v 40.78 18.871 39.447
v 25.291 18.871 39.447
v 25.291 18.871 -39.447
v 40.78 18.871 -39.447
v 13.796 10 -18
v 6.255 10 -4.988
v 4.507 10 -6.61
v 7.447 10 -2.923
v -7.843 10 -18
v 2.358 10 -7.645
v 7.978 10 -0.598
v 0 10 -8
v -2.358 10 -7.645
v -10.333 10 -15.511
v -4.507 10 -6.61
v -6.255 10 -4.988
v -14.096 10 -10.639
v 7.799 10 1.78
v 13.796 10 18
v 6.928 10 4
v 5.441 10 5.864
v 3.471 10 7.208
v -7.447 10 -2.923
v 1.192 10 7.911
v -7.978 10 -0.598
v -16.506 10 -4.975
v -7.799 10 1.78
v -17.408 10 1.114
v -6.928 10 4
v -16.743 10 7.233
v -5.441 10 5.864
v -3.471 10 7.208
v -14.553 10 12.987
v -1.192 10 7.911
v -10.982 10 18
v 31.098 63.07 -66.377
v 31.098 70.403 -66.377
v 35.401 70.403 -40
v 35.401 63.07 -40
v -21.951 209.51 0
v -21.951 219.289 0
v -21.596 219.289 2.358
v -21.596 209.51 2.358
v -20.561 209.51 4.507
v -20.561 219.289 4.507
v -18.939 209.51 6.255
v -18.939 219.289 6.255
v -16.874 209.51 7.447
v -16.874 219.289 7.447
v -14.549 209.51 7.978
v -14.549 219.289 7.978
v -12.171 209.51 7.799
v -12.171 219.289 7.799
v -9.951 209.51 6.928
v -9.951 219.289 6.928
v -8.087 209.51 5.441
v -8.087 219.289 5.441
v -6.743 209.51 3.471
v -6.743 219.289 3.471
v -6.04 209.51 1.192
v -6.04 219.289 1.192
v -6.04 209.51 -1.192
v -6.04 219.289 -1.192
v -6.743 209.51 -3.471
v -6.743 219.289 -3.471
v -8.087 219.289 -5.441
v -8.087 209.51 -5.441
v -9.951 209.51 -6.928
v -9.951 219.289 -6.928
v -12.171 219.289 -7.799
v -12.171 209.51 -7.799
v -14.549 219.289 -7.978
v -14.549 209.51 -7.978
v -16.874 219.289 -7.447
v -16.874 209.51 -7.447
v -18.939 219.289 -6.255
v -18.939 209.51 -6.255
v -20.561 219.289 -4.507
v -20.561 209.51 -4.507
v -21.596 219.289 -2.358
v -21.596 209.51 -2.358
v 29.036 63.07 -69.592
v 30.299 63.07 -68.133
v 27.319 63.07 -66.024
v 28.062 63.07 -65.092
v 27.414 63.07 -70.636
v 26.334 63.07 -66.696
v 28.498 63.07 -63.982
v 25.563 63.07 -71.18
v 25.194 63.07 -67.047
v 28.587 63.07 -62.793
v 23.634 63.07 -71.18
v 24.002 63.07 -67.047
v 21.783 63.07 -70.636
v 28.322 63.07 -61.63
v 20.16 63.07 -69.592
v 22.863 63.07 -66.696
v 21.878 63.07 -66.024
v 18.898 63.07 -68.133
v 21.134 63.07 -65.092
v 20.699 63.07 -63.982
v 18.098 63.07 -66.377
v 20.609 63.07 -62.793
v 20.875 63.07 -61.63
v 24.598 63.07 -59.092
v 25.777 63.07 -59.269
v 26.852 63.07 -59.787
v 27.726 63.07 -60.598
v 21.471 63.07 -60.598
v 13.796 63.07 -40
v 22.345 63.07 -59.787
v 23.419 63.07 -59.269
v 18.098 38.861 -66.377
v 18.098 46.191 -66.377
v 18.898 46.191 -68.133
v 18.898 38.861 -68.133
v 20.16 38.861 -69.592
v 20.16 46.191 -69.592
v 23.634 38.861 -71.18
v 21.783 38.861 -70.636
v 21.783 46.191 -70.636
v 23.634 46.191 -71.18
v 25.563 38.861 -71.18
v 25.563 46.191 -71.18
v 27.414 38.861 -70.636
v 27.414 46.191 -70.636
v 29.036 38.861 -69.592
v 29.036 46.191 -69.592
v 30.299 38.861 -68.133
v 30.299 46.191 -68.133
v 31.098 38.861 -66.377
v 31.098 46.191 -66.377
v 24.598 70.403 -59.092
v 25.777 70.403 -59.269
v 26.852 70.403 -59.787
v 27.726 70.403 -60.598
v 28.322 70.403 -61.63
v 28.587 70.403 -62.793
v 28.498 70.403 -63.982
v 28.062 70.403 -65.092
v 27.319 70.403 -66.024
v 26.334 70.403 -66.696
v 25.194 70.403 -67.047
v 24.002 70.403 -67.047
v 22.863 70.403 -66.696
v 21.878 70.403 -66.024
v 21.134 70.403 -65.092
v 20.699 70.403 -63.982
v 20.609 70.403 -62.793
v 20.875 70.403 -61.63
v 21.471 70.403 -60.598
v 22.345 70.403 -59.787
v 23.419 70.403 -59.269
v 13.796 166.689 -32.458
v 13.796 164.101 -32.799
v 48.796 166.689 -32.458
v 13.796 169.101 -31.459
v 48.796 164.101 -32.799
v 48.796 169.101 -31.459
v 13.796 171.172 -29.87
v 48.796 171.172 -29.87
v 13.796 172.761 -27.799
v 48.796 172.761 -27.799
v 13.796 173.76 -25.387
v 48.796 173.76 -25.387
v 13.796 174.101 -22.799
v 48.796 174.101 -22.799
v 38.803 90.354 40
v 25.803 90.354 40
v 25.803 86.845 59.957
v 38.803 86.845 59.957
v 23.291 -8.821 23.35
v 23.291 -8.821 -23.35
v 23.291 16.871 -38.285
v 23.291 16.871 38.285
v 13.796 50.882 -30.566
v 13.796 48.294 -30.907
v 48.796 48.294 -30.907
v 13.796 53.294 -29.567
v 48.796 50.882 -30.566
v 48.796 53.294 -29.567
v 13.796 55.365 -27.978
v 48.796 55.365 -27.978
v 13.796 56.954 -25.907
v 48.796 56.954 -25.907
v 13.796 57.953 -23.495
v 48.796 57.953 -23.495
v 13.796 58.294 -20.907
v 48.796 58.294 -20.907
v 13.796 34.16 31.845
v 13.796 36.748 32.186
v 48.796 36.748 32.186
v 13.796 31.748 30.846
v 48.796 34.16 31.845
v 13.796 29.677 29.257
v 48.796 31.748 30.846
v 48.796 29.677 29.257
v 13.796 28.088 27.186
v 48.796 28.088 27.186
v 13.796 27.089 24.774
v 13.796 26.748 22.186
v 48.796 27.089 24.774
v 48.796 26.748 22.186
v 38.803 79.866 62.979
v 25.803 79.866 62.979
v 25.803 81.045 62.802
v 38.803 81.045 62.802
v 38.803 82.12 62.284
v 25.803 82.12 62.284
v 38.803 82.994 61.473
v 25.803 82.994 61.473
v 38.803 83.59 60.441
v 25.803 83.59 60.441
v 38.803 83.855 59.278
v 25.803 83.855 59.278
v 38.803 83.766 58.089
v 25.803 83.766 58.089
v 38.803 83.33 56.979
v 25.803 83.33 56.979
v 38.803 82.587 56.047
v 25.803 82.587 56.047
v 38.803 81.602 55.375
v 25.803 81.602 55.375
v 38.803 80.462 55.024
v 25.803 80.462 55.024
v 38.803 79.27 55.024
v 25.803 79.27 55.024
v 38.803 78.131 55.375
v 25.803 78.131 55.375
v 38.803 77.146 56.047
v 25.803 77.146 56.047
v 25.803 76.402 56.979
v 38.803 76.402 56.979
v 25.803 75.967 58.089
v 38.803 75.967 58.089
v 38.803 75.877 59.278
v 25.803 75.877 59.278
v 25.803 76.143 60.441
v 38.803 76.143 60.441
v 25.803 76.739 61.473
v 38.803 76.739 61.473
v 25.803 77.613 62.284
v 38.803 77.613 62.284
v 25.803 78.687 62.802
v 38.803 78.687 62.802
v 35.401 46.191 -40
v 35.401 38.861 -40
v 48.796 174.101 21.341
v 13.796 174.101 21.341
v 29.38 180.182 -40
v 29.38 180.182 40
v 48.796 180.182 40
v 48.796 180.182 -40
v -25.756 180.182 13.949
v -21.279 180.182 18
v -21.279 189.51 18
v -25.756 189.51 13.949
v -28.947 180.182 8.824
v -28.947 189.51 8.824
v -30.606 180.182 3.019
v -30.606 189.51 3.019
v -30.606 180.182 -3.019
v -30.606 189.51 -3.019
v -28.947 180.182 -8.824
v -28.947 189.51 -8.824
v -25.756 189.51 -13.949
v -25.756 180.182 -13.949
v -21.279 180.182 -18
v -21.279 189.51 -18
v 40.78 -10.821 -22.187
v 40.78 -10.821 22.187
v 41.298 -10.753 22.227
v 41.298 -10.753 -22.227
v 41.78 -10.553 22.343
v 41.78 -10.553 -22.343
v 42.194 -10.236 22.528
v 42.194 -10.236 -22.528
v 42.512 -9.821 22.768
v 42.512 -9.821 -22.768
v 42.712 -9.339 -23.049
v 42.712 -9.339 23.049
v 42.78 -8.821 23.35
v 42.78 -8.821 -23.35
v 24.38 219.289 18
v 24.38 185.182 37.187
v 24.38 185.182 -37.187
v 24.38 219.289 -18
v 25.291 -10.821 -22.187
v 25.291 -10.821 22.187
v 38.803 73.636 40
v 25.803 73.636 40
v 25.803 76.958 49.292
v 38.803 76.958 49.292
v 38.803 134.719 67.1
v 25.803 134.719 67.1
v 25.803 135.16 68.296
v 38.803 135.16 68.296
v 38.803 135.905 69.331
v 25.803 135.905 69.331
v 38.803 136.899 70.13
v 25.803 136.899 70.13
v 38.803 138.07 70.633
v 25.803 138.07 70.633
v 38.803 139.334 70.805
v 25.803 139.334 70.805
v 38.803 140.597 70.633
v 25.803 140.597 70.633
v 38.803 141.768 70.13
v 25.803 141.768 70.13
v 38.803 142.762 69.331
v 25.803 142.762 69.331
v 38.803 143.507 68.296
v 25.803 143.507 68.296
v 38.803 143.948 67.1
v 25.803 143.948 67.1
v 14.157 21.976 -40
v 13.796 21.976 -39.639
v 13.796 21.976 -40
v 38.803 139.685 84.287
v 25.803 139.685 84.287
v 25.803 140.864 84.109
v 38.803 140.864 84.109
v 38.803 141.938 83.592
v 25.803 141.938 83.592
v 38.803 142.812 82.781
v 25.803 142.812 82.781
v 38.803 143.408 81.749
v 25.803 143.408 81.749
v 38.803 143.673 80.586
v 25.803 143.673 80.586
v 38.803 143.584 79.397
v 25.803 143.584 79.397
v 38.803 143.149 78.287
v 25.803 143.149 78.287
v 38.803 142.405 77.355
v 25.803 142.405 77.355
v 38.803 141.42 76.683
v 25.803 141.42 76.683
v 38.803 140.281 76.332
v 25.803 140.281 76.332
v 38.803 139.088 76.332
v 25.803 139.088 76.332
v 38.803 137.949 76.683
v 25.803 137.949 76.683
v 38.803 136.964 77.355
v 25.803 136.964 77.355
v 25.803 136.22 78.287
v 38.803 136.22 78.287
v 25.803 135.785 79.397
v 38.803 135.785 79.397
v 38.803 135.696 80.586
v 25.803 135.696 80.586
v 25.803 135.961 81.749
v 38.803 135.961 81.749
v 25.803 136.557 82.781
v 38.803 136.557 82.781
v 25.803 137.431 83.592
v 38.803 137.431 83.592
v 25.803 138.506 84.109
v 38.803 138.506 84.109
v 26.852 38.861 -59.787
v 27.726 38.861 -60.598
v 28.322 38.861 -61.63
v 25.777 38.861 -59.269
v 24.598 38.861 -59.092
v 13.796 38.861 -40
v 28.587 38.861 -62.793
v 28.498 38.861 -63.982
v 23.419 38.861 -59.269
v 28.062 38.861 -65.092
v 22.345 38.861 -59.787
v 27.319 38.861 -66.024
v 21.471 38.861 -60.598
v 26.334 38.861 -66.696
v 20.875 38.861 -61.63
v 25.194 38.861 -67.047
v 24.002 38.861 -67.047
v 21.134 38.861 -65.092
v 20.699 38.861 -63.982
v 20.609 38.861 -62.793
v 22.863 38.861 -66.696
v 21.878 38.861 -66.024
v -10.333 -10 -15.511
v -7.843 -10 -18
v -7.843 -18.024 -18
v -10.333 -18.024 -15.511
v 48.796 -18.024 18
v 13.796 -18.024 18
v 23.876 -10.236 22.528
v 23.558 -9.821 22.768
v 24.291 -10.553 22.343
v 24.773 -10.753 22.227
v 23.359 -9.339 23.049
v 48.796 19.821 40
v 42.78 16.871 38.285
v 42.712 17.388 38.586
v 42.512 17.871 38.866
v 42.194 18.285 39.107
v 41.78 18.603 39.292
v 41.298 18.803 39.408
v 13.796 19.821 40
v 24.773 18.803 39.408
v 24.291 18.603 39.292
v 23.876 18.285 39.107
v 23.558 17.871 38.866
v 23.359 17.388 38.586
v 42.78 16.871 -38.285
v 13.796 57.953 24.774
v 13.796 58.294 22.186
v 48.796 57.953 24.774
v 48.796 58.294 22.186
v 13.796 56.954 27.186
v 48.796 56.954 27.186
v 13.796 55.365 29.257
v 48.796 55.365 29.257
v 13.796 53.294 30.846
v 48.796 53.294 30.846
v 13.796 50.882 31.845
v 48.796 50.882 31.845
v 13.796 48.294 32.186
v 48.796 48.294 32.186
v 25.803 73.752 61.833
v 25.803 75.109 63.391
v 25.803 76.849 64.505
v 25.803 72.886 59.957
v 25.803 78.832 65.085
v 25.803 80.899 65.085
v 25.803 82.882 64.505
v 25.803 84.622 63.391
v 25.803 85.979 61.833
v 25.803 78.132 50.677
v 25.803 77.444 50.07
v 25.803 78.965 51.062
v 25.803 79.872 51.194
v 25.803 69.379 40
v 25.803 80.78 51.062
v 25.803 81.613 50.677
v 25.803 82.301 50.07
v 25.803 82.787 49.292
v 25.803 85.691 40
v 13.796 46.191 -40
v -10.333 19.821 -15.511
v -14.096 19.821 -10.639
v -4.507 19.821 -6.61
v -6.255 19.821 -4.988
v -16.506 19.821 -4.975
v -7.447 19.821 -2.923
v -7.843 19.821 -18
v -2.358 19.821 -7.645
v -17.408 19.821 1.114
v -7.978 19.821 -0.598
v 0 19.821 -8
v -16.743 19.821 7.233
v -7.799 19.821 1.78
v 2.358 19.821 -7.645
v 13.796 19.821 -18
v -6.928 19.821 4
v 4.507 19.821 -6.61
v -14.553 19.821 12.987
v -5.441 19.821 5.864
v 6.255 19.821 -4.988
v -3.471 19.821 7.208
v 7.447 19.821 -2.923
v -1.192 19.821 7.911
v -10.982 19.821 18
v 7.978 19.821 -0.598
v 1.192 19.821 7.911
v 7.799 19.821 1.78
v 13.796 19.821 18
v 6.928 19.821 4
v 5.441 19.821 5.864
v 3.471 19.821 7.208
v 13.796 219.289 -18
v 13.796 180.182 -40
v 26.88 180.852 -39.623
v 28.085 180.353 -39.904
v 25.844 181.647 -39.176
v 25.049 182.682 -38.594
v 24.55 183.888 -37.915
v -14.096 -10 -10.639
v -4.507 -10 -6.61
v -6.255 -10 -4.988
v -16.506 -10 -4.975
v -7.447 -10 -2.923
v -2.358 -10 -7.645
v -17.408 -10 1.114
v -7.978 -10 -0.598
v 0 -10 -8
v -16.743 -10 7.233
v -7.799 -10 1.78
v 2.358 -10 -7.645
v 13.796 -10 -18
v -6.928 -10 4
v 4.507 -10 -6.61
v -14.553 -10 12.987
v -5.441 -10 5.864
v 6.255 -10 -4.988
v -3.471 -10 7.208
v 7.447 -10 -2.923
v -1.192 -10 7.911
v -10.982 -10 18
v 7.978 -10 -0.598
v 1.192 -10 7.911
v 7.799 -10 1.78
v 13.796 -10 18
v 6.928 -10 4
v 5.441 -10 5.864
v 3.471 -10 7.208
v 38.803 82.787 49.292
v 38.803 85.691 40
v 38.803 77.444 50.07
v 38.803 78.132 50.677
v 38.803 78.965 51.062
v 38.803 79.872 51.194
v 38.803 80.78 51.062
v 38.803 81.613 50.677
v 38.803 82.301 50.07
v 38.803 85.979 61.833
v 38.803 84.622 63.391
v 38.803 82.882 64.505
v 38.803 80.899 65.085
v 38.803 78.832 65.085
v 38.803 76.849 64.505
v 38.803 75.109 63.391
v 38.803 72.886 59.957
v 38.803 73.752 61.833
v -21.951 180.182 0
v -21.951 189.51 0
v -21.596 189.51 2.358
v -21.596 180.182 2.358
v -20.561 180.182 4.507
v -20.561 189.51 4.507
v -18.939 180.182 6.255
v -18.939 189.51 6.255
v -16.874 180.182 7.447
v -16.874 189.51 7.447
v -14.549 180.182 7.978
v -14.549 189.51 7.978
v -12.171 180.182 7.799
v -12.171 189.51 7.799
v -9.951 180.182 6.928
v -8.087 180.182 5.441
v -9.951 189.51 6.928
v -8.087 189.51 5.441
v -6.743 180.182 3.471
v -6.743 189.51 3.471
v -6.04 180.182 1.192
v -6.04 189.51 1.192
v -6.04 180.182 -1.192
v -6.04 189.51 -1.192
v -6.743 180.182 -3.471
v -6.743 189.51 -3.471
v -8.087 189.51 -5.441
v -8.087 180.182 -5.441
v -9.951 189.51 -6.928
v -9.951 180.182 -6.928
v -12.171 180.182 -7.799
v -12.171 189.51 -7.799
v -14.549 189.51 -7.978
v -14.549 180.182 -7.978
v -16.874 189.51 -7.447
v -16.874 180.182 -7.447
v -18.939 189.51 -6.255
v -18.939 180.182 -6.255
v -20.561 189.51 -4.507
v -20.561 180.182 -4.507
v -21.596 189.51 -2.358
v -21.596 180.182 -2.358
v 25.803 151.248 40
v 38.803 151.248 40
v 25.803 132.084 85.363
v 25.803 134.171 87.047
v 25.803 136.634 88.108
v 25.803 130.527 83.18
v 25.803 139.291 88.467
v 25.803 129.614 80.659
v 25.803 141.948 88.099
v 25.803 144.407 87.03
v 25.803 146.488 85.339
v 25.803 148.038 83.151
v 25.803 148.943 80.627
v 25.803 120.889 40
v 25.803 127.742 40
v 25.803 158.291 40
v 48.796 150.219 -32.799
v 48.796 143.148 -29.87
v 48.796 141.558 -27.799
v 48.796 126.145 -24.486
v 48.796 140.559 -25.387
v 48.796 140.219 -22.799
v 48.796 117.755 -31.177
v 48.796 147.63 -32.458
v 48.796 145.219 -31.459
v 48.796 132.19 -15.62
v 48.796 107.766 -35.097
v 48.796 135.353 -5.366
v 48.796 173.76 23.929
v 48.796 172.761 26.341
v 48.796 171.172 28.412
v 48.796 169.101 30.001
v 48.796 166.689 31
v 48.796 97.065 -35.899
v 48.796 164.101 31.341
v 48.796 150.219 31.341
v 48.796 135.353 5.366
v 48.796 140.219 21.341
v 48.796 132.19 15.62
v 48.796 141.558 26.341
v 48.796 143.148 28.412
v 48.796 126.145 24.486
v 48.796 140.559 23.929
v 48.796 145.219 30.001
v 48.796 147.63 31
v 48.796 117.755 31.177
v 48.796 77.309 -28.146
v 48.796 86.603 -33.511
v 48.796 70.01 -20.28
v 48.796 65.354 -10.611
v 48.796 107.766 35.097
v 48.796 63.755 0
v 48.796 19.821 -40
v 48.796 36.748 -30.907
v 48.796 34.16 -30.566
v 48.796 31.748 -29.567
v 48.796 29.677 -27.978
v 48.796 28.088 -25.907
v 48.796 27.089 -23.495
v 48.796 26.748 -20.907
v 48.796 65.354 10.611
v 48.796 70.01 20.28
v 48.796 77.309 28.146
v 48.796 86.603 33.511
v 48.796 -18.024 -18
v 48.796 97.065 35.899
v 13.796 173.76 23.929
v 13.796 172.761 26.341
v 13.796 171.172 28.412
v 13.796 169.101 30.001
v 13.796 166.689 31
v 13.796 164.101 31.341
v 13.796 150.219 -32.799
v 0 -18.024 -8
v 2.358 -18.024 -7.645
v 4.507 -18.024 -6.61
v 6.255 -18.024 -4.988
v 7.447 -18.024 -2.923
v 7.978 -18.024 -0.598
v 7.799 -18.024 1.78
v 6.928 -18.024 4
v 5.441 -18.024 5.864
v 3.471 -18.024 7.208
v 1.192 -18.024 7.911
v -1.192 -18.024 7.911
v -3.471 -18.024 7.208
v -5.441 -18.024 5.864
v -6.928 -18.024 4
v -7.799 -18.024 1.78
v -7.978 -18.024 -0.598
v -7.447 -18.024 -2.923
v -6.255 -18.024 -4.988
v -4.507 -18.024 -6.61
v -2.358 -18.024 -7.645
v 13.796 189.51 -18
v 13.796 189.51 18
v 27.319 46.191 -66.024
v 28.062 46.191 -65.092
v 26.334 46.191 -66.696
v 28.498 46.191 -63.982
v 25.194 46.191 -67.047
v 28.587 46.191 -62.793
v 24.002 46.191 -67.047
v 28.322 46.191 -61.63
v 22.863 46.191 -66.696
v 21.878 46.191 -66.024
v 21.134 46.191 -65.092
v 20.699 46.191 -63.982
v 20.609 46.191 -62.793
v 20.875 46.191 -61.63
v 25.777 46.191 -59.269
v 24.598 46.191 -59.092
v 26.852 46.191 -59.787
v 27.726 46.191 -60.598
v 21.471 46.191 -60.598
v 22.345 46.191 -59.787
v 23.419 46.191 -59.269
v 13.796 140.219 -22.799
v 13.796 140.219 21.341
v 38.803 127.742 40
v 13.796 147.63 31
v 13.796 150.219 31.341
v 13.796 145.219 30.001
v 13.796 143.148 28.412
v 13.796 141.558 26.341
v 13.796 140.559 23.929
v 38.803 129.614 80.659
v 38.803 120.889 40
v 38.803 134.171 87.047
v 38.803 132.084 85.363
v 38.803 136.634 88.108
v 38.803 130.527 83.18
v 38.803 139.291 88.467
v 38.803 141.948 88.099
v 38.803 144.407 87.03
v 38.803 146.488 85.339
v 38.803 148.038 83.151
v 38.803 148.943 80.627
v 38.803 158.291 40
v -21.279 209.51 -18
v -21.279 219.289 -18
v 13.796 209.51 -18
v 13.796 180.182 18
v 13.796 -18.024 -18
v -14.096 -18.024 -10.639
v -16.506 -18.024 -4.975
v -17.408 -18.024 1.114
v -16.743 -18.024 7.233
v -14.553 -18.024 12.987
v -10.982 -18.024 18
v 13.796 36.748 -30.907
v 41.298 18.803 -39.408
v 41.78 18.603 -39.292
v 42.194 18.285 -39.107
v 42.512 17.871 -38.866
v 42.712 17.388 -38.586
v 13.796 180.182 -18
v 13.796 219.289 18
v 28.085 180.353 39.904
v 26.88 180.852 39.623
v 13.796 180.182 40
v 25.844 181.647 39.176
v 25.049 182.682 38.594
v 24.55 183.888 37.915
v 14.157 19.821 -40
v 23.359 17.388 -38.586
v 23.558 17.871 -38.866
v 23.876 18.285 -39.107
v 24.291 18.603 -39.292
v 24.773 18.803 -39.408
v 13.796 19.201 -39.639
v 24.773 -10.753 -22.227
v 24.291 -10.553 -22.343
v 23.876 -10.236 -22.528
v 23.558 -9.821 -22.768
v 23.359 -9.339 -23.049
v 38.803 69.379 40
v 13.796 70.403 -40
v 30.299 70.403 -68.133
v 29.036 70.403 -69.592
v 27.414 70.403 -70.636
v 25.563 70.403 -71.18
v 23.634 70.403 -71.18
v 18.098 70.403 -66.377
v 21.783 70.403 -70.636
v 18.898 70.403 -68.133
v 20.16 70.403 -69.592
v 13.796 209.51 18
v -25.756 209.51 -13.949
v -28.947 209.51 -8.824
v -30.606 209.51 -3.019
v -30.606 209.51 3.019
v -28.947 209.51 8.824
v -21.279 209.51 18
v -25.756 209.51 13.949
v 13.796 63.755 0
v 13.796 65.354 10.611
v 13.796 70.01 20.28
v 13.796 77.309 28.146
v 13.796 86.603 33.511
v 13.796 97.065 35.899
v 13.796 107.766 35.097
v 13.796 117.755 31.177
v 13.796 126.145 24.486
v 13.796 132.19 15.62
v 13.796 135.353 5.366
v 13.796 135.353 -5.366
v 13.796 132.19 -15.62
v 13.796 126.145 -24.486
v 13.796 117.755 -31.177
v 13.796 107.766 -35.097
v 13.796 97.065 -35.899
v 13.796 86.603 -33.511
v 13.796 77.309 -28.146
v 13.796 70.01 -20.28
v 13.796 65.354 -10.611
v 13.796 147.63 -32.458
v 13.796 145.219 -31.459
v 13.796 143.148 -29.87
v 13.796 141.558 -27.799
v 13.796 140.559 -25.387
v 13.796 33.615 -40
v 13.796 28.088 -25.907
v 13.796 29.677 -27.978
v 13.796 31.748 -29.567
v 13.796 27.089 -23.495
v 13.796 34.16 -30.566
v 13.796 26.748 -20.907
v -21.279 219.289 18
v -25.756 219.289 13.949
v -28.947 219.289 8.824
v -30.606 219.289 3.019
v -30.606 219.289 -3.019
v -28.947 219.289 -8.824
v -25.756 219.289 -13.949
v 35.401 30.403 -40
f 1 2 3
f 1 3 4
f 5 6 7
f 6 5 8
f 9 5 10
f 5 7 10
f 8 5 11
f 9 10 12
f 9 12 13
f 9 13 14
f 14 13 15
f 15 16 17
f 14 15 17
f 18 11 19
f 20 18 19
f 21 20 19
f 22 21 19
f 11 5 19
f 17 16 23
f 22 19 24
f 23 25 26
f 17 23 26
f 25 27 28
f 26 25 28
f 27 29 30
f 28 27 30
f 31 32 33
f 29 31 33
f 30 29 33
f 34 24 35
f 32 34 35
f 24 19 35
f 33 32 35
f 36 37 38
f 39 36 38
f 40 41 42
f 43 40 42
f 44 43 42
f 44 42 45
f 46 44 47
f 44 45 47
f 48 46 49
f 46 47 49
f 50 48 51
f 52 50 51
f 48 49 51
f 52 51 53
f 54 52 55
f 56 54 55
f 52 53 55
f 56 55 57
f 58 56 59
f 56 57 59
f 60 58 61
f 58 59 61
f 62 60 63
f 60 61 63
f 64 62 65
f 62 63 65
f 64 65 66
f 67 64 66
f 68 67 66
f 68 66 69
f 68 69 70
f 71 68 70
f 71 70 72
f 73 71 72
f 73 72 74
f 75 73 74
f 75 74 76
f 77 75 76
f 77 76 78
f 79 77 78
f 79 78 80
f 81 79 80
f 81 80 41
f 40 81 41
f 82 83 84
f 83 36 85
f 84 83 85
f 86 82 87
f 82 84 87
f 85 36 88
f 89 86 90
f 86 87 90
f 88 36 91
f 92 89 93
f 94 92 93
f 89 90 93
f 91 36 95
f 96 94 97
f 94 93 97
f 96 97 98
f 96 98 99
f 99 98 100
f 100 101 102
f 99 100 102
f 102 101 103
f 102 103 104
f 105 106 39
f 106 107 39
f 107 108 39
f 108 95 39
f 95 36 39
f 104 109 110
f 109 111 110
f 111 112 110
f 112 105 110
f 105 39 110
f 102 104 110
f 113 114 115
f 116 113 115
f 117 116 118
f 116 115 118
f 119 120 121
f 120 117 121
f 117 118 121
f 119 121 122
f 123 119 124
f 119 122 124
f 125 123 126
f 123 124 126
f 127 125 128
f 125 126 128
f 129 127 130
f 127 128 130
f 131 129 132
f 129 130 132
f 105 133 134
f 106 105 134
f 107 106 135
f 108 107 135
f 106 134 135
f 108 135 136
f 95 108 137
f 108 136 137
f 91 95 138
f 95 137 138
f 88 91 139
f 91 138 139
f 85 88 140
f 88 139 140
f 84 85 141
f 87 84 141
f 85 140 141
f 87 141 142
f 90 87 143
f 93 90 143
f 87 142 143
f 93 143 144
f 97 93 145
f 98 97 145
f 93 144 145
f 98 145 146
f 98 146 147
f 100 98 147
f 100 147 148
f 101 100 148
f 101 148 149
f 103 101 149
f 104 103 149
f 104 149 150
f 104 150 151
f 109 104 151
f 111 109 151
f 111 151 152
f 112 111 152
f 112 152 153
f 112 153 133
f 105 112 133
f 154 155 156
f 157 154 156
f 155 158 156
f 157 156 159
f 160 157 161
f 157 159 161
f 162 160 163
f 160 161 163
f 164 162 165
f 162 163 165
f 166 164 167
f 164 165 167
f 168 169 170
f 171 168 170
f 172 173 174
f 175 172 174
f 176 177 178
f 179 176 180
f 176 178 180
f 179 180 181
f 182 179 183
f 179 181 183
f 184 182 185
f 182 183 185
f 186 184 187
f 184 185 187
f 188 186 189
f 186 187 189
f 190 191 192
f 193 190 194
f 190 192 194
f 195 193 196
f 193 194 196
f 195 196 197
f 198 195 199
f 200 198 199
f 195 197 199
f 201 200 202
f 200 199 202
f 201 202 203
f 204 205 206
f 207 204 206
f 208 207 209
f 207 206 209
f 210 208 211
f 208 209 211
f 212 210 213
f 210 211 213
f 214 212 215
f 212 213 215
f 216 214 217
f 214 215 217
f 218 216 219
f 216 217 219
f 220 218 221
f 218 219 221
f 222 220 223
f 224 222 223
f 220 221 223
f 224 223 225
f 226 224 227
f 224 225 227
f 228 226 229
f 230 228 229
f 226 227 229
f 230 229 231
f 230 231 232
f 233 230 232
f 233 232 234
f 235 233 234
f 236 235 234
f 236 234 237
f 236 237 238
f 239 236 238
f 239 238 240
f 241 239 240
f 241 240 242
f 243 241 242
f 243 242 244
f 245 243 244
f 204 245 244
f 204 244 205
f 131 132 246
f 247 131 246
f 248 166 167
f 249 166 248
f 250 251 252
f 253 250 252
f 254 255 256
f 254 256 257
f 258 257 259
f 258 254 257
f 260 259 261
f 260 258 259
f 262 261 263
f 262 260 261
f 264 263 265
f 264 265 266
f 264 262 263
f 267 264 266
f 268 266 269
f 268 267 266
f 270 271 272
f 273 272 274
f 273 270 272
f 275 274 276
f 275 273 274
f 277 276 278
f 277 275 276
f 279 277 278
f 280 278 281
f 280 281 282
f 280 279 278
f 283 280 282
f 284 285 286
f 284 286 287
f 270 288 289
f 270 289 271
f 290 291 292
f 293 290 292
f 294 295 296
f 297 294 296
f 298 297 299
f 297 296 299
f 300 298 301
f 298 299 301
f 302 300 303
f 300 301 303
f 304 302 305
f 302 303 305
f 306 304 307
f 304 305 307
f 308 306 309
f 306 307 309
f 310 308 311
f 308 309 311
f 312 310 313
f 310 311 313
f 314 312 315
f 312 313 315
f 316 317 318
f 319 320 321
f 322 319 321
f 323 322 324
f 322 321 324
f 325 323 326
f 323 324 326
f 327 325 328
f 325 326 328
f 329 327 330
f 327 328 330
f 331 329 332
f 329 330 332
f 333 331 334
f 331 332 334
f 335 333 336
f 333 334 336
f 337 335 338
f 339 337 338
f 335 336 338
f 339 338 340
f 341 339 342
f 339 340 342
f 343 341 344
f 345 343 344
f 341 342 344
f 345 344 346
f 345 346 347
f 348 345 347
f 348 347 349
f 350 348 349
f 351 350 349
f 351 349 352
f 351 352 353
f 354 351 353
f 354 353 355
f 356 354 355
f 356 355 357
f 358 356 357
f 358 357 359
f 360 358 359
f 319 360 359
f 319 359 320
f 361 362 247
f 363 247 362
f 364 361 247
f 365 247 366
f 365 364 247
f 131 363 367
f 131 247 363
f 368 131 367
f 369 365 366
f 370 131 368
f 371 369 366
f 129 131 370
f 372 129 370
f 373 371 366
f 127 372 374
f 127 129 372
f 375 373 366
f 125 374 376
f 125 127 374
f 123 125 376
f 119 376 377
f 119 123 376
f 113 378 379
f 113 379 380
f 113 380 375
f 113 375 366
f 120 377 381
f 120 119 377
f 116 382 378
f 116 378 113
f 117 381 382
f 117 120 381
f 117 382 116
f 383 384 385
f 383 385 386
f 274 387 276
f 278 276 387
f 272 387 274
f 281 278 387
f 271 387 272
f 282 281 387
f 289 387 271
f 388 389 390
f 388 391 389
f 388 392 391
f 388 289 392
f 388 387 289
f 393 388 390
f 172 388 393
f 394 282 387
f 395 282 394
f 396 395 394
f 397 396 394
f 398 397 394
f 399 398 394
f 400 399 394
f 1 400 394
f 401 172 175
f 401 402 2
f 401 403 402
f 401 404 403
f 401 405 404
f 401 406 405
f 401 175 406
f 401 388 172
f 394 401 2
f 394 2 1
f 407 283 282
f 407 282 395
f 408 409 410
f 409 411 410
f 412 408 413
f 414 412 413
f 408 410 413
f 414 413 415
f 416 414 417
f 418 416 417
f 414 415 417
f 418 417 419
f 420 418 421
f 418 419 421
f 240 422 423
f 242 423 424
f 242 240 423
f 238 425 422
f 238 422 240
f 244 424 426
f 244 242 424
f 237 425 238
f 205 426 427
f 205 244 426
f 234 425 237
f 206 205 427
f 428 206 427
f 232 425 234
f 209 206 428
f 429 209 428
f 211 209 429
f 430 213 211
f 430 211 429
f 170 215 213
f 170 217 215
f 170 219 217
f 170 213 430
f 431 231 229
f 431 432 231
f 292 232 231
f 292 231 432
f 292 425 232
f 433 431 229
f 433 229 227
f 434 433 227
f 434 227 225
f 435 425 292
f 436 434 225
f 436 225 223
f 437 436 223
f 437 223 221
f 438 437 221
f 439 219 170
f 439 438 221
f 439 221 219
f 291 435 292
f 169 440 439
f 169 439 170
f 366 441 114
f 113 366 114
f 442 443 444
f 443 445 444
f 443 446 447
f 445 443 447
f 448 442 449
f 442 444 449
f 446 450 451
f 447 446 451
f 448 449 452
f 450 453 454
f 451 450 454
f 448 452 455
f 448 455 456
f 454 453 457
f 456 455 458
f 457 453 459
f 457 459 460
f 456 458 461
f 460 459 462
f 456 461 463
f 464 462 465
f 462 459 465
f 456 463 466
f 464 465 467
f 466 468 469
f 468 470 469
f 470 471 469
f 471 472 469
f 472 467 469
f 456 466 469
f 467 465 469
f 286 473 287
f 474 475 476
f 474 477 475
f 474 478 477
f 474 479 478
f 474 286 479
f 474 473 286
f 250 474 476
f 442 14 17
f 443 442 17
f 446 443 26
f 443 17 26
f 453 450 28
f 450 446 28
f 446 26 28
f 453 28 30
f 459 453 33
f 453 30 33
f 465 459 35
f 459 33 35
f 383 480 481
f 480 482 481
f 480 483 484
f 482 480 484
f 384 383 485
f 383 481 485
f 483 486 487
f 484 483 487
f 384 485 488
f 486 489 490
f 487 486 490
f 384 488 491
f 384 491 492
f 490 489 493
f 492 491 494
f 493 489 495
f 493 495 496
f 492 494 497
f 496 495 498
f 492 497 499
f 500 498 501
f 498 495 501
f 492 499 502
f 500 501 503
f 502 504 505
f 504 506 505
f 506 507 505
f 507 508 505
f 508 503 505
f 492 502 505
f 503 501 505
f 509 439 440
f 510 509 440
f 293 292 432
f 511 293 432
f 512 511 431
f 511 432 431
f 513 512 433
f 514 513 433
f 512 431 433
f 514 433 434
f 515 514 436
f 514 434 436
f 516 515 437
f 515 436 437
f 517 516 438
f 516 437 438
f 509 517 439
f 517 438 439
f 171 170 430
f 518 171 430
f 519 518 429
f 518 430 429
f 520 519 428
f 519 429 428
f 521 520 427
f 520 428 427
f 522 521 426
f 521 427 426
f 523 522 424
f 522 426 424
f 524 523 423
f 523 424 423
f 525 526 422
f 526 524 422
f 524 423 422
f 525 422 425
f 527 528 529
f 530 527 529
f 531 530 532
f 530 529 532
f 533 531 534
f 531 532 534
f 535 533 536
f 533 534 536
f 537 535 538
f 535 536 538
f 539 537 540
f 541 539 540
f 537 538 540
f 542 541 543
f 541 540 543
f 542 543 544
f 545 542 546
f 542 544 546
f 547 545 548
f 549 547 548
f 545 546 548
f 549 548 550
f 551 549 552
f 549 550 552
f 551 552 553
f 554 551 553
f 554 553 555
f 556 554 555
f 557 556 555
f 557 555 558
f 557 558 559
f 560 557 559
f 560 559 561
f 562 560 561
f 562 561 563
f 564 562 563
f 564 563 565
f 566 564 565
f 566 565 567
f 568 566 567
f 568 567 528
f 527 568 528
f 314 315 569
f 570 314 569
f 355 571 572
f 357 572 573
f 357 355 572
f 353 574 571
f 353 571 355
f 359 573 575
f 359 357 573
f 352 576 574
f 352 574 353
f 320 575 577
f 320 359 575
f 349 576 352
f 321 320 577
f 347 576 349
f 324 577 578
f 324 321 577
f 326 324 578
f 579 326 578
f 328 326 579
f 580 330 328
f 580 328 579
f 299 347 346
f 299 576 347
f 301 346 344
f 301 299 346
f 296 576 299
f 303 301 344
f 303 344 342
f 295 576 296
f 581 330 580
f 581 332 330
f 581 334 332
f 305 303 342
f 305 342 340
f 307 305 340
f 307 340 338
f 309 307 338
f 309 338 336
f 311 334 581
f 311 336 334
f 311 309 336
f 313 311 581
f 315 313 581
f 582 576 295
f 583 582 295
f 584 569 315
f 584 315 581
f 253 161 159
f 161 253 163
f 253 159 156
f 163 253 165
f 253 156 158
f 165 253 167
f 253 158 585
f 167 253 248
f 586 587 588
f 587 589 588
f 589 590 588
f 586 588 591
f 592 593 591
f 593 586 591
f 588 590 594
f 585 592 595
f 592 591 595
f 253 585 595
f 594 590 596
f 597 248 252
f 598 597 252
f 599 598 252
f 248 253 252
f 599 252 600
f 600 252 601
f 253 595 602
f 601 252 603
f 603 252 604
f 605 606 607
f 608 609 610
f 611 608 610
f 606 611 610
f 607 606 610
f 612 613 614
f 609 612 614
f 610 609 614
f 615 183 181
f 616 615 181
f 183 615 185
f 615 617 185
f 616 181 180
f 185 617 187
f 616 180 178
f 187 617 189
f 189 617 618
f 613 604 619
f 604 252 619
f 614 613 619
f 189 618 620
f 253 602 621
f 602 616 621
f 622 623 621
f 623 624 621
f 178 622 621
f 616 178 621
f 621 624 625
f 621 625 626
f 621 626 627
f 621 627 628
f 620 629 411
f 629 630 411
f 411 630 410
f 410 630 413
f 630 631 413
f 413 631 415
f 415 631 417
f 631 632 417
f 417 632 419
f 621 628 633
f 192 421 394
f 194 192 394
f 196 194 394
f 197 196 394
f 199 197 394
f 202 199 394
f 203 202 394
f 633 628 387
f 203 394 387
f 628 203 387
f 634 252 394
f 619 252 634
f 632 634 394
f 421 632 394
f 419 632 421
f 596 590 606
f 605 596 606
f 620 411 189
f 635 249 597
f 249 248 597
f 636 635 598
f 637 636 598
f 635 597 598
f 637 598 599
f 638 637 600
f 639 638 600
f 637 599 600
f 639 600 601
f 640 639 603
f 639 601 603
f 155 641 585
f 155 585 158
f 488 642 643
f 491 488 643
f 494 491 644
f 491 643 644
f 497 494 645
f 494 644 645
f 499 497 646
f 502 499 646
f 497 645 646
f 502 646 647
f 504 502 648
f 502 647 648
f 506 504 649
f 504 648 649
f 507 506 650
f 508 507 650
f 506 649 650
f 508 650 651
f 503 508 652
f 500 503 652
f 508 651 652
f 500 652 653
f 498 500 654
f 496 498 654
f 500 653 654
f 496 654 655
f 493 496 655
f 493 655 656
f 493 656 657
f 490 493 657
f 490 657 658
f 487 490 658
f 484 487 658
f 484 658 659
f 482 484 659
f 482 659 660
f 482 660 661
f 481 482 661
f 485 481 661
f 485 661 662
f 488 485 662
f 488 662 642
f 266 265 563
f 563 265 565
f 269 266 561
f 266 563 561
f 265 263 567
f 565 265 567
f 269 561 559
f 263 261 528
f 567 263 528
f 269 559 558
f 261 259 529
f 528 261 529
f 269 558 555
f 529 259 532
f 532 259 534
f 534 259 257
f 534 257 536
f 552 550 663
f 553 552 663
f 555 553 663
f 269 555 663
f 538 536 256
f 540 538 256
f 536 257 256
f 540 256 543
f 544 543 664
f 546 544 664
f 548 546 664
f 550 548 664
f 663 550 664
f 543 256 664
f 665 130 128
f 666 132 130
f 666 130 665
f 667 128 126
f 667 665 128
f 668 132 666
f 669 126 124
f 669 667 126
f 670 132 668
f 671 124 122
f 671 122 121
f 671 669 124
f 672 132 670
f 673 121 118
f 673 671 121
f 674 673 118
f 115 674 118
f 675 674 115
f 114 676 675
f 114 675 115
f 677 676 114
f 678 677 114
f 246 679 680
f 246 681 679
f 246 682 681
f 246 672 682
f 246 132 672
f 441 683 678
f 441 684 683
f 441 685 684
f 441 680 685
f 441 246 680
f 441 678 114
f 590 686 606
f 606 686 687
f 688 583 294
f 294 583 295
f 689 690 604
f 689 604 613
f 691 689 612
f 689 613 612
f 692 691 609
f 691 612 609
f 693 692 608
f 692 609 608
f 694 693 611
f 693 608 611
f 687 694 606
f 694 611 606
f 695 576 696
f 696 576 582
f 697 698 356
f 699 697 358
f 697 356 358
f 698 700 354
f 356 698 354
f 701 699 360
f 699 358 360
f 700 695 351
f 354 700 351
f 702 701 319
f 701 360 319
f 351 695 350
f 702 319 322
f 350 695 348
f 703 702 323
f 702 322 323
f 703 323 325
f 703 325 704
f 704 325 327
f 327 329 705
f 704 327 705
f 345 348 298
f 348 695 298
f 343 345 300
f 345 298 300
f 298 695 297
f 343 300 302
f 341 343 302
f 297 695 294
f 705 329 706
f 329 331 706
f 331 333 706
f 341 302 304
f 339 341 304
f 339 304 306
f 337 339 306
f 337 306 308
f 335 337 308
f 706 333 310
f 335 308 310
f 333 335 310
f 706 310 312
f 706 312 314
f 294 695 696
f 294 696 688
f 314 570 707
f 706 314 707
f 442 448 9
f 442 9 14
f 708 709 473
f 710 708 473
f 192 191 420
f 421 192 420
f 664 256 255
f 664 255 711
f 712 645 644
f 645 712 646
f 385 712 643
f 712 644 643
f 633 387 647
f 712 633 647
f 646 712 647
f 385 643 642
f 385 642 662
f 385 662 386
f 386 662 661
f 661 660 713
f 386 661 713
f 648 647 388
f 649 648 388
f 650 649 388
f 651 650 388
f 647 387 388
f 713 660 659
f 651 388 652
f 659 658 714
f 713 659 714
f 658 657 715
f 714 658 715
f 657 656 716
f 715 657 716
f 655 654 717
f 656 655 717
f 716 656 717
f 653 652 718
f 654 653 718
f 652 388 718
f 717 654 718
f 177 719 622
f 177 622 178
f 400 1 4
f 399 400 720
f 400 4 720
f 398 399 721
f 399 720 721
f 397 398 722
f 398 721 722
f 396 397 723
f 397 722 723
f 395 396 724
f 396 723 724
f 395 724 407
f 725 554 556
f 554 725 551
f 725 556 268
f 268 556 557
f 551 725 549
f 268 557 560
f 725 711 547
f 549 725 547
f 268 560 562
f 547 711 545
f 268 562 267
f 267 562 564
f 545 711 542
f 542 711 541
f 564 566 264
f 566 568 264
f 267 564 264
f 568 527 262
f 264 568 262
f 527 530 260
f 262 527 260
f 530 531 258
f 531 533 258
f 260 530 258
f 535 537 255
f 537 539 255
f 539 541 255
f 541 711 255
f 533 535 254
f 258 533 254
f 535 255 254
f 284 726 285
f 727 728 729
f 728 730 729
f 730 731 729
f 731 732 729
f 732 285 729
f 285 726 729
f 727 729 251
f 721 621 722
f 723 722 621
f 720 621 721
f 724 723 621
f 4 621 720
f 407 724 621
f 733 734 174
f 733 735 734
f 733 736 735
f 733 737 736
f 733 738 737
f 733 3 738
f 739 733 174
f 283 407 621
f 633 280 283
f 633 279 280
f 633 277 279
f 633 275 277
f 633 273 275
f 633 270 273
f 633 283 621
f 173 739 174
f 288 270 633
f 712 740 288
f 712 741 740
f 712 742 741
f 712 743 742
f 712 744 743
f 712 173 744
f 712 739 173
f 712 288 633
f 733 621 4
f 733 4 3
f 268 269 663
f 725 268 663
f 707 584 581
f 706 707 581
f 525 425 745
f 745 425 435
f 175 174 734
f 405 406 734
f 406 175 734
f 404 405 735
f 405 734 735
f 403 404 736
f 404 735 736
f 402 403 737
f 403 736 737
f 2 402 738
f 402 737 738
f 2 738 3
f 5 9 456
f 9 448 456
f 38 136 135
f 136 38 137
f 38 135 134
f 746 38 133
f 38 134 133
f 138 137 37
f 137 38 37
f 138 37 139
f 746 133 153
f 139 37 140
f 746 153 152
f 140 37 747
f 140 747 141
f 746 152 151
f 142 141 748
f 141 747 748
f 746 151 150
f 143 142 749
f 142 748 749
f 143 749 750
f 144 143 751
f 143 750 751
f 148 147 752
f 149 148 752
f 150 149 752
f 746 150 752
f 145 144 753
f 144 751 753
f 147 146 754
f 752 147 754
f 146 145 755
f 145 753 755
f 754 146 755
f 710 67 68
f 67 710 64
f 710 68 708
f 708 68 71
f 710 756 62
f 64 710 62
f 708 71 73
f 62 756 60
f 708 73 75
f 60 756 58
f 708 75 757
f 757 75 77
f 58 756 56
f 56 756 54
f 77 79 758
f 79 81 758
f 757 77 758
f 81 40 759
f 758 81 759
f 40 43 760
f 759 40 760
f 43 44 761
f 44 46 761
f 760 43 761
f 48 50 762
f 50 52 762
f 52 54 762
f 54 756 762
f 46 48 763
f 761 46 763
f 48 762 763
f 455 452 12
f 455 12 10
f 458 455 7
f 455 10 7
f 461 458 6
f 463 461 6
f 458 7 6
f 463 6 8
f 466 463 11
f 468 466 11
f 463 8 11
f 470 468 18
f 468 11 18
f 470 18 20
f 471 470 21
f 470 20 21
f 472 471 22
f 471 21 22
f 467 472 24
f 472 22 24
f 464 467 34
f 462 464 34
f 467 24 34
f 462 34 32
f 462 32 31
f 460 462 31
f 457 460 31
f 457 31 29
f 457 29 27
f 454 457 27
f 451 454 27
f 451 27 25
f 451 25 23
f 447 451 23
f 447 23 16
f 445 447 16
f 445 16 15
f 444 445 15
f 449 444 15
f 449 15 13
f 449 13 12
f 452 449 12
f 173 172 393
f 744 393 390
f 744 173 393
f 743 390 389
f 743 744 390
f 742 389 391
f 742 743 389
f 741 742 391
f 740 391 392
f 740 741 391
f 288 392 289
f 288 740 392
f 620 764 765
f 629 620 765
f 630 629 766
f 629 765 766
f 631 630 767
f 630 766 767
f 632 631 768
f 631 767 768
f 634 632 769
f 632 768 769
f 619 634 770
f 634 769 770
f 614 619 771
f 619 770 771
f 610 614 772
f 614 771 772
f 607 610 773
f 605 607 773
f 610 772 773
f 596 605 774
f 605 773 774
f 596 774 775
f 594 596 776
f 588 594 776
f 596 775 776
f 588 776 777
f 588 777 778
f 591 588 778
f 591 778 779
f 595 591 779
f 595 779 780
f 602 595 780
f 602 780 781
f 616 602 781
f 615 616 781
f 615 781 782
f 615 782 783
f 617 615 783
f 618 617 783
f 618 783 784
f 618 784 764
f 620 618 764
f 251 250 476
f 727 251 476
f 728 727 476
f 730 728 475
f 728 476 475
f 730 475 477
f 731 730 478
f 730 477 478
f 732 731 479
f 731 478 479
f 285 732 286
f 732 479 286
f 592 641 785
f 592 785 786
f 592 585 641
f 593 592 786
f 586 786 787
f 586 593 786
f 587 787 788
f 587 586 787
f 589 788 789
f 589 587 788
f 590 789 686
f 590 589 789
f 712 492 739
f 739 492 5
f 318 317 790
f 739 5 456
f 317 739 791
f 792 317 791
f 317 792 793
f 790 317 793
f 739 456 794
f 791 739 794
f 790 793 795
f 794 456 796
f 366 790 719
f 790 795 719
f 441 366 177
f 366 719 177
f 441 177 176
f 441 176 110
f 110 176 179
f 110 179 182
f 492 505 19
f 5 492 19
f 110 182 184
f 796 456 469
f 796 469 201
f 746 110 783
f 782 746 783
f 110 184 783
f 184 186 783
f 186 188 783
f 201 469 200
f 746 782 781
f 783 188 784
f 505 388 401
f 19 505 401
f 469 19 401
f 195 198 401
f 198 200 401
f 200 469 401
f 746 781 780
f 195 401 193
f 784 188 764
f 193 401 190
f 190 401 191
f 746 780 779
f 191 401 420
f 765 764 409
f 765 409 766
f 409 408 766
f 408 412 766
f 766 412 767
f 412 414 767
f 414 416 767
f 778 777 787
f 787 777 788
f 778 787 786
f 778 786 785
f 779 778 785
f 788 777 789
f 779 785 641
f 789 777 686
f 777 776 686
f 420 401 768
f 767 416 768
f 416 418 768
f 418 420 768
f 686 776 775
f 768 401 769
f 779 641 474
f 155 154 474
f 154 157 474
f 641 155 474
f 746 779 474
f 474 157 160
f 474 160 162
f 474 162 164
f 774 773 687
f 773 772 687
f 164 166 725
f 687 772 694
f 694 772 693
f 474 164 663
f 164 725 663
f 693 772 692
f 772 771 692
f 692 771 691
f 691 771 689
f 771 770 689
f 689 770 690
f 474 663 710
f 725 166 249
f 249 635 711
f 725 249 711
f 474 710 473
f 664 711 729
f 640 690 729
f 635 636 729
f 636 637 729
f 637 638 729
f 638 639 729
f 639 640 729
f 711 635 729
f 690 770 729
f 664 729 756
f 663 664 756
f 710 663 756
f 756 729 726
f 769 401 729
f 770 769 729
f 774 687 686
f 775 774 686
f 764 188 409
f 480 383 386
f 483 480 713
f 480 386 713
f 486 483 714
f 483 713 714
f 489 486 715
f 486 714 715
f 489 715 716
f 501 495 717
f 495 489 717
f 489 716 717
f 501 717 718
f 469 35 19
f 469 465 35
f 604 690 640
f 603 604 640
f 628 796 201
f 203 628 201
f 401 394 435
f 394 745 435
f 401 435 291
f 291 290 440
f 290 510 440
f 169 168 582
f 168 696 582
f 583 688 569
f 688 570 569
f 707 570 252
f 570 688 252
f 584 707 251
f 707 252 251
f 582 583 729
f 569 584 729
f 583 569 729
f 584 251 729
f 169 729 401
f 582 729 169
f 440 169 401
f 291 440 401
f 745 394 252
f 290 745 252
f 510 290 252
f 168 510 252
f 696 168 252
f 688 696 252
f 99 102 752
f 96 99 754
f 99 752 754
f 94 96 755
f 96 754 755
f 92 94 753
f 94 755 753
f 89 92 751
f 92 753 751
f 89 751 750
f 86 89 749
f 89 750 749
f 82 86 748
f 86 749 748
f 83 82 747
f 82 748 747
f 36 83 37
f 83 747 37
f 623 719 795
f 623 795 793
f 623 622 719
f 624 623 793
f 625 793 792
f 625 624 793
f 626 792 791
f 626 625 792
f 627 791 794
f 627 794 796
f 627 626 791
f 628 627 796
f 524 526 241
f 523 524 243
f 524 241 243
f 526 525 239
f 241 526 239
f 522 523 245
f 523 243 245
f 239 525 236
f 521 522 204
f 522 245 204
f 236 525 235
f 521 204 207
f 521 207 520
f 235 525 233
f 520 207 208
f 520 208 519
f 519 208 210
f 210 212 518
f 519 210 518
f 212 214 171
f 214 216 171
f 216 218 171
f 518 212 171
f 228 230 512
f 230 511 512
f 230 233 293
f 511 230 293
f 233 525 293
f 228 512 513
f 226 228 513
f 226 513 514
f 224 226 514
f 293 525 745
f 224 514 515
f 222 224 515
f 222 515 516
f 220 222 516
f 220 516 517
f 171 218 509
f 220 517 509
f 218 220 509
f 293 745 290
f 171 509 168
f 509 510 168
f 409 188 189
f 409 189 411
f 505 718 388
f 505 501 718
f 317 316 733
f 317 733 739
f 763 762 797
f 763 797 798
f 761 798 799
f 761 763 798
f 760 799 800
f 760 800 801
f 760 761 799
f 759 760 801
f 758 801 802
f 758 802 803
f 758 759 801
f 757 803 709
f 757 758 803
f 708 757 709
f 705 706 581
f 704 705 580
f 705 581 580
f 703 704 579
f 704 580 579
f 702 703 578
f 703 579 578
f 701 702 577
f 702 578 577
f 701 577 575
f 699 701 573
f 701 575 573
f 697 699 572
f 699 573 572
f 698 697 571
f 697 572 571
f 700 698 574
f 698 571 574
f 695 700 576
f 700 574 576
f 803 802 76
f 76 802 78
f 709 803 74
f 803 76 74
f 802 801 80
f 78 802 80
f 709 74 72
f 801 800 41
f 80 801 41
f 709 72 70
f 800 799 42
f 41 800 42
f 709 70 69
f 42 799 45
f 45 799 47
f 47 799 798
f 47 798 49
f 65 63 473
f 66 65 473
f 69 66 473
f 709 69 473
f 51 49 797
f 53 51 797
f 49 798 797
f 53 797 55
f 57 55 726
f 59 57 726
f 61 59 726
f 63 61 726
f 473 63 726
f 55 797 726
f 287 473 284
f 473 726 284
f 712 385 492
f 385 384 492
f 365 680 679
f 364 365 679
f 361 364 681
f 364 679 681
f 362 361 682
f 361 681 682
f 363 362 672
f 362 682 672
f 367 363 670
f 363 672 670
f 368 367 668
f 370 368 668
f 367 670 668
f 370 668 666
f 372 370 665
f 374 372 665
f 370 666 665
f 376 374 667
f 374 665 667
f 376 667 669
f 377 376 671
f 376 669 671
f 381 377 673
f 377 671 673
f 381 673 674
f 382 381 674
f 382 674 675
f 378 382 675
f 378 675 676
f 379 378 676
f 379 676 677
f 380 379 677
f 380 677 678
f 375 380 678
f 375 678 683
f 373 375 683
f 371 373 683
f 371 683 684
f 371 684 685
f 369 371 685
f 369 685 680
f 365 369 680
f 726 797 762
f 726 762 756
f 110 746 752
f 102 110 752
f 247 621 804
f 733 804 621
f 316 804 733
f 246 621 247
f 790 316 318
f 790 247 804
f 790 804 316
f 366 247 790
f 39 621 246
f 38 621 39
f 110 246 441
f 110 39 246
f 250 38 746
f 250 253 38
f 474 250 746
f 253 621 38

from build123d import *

# Parameters (mm, degrees)
BOSS_EXTRUDE1_DEPTH            = 40
CUT_EXTRUDE1_REACH             = 247.558
SKETCH3_R                      = 8
CUT_EXTRUDE1_DIRECTION_2_DEPTH = 246.557512105
CUT_EXTRUDE2_REACH             = 247.558
SKETCH5_R                      = 8
SKETCH7_R                      = 36
CUT_EXTRUDE3_DEPTH             = 35
SKETCH8_W                      = 21.604680843
SKETCH8_H                      = 11.583217502
SKETCH8_H_2                    = 12.576064717
BOSS_EXTRUDE3_DEPTH            = 32
CUT_EXTRUDE4_REACH             = 170.774
SKETCH9_R                      = 4
SKETCH10_W                     = 13
SKETCH10_H                     = 51.29710608
SKETCH10_H_2                   = 20.975155012
BOSS_EXTRUDE4_DEPTH            = 50
SKETCH11_R                     = 4
CUT_EXTRUDE5_DEPTH             = 50
CUT_EXTRUDE7_DEPTH             = 245.136802941
SKETCH15_W                     = 21.604680843
SKETCH15_H                     = 4.250308509
SKETCH15_H_2                   = 5.246064717
CUT_EXTRUDE8_DEPTH             = 32
CUT_EXTRUDE11_DEPTH            = 245.136802941
CUT_EXTRUDE12_DEPTH            = 245.136802941
SKETCH21_W                     = 24.416384629
SKETCH21_H                     = 39.106853427
CUT_EXTRUDE13_DEPTH            = 252.023351524
FILLET1_R                      = 5
SKETCH28_W                     = 19.48947631
SKETCH28_H                     = 29.692020957
CUT_EXTRUDE17_DEPTH            = 252.023351524
CUT_EXTRUDE19_DEPTH            = 40
CUT_EXTRUDE20_DEPTH            = 40
FILLET4_R                      = 2
CUT_EXTRUDE21_DEPTH            = 40
SKETCH35_W                     = 64.140186451
SKETCH35_H                     = 33.882408076
CUT_EXTRUDE25_DEPTH            = 241.633233856
FILLET5_R                      = 10
SKETCH36_W                     = 63.092398873
SKETCH36_H                     = 31.546199436
CUT_EXTRUDE26_DEPTH            = 241.633233856
FILLET6_R                      = 10
CUT_EXTRUDE27_DEPTH            = 258.924257322
CUT_EXTRUDE29_DEPTH            = 241.633233856
CUT_EXTRUDE32_DEPTH            = 241.633233856


with BuildPart() as part:
    # Sketch1 → Boss-Extrude1 (new, symmetric)
    with BuildSketch(Plane.XY):
        Polygon((48.795922062, 219.289035295), (48.795922062, -18.023943156), (-20.482716366, -18.023943156), (-20.482716366, -10), (13.795922062, -10), (13.795922062, 10), (-20.482716366, 10), (-20.482716366, 19.821446156), (13.795922062, 19.821446156), (13.795922062, 180.182181868), (-32.635756138, 180.182181868), (-32.635756138, 189.509917116), (13.795922062, 189.509917116), (13.795922062, 209.509917116), (-32.635756138, 209.509917116), (-32.635756138, 219.289035295), align=None)
    extrude(amount=BOSS_EXTRUDE1_DEPTH, both=True)

    # Cut-Extrude1: up to this face of the body (flat: up to its plane)
    cut_extrude1_end = Plane(part.part.faces().sort_by_distance((-9.419917038, 180.182181868, 0))[0])
    # Sketch3 → Cut-Extrude1 (cut, up to the picked face)
    with BuildSketch(Plane(origin=(0, 219.289035295, 0), x_dir=(1, 0, 0), z_dir=(0, 1, 0)), mode=Mode.PRIVATE) as cut_extrude1_sk1:
        with Locations(Location((-13.951092455, 0, 0), (0, 0, 180))):
            Circle(SKETCH3_R)
    cut_extrude1_tool1 = split(extrude(cut_extrude1_sk1.sketch, amount=-CUT_EXTRUDE1_REACH, mode=Mode.PRIVATE), bisect_by=cut_extrude1_end, keep=Keep.BOTH, mode=Mode.PRIVATE)
    add(cut_extrude1_tool1.solids().sort_by(Axis((-13.951092, 219.289035, 0), (0, -1, 0)))[0], mode=Mode.SUBTRACT)

    # Sketch3 → Cut-Extrude1 direction 2 (cut)
    with BuildSketch(Plane(origin=(0, 219.289035295, 0), x_dir=(1, 0, 0), z_dir=(0, 1, 0))):
        with Locations(Location((-13.951092455, 0, 0), (0, 0, 180))):
            Circle(SKETCH3_R)
    extrude(amount=CUT_EXTRUDE1_DIRECTION_2_DEPTH, mode=Mode.SUBTRACT)

    # Cut-Extrude2: up to this face of the body (flat: up to its plane)
    cut_extrude2_end = Plane(part.part.faces().sort_by_distance((-3.343397152, 19.821446156, 0))[0])
    # Sketch5 → Cut-Extrude2 (cut, up to the picked face)
    with BuildSketch(Plane(origin=(0, -18.023943156, 0), x_dir=(-1, 0, 0), z_dir=(0, -1, 0)), mode=Mode.PRIVATE) as cut_extrude2_sk1:
        with Locations(Location((0, 0, 0), (0, 0, 90))):
            Circle(SKETCH5_R)
    cut_extrude2_tool1 = split(extrude(cut_extrude2_sk1.sketch, amount=-CUT_EXTRUDE2_REACH, mode=Mode.PRIVATE), bisect_by=cut_extrude2_end, keep=Keep.BOTH, mode=Mode.PRIVATE)
    add(cut_extrude2_tool1.solids().sort_by(Axis((0, -18.023943, 0), (0, 1, 0)))[0], mode=Mode.SUBTRACT)

    # Sketch7 → Cut-Extrude3 (cut)
    with BuildSketch(Plane.ZY.offset(-13.795922062)):
        with Locations(Location((0, 99.754958558, 0), (0, 0, 270))):
            Circle(SKETCH7_R)
    extrude(amount=-CUT_EXTRUDE3_DEPTH, mode=Mode.SUBTRACT)

    # Sketch8 → Boss-Extrude3 (add)
    with BuildSketch(Plane(origin=(0, 0, -40), x_dir=(-1, 0, 0), z_dir=(0, 0, -1))):
        with Locations((-24.598262484, 68.861435207)):
            Rectangle(SKETCH8_W, SKETCH8_H)
        with Locations((-24.598262484, 39.903391451)):
            Rectangle(SKETCH8_W, SKETCH8_H_2)
    extrude(amount=BOSS_EXTRUDE3_DEPTH)

    # Cut-Extrude4: up to this face of the body (flat: up to its plane)
    cut_extrude4_end = Plane(part.part.faces().sort_by_distance((24.598262483, 33.615359093, -56))[0])
    # Sketch9 → Cut-Extrude4 (cut, up to the picked face)
    with BuildSketch(Plane(origin=(0, 74.653043958, 0), x_dir=(1, 0, 0), z_dir=(0, 1, 0)), mode=Mode.PRIVATE) as cut_extrude4_sk1:
        with Locations(Location((24.598262483, 63.091770197, 0), (0, 0, 270))):
            Circle(SKETCH9_R)
    cut_extrude4_tool1 = split(extrude(cut_extrude4_sk1.sketch, amount=-CUT_EXTRUDE4_REACH, mode=Mode.PRIVATE), bisect_by=cut_extrude4_end, keep=Keep.BOTH, mode=Mode.PRIVATE)
    add(cut_extrude4_tool1.solids().sort_by(Axis((24.598262, 74.653044, -63.09177), (0, -1, 0)))[0], mode=Mode.SUBTRACT)

    # Sketch10 → Boss-Extrude4 (add)
    with BuildSketch(Plane.XY.offset(40)):
        with Locations((32.303079831, 139.684536505)):
            Rectangle(SKETCH10_W, SKETCH10_H)
        with Locations((32.303079831, 79.86631507)):
            Rectangle(SKETCH10_W, SKETCH10_H_2)
    extrude(amount=BOSS_EXTRUDE4_DEPTH)

    # Sketch11 → Cut-Extrude5 (cut)
    with BuildSketch(Plane.ZY.offset(-25.803079831)):
        with Locations((80.287201061, 139.684536505)):
            Circle(SKETCH11_R)
        with Locations((58.979212318, 79.86631507)):
            Circle(SKETCH11_R)
    extrude(amount=-CUT_EXTRUDE5_DEPTH, mode=Mode.SUBTRACT)

    # Sketch14 → Cut-Extrude7 (cut, through all)
    with BuildSketch(Plane.ZY.offset(-25.803079831)):
        with BuildLine():
            Line((40, 90.353892576), (59.957148772, 86.844568036))
            ThreePointArc((59.957148772, 86.844568036), (65.158938112, 79.865441553), (59.957148772, 72.88631507))
            Line((59.957148772, 72.88631507), (40, 69.378737564))
            Line((40, 69.378737564), (90, 69.378737564))
            Line((90, 69.378737564), (90, 90.353892576))
            Line((90, 90.353892576), (40, 90.353892576))
        make_face()
    extrude(amount=-CUT_EXTRUDE7_DEPTH, mode=Mode.SUBTRACT)

    # Sketch15 → Cut-Extrude8 (cut)
    with BuildSketch(Plane(origin=(0, 0, -72), x_dir=(-1, 0, 0), z_dir=(0, 0, -1))):
        with Locations((-24.598262484, 72.527889703)):
            Rectangle(SKETCH15_W, SKETCH15_H)
        with Locations((-24.598262484, 36.238391452)):
            Rectangle(SKETCH15_W, SKETCH15_H_2)
    extrude(amount=-CUT_EXTRUDE8_DEPTH, mode=Mode.SUBTRACT)

    # Sketch19 → Cut-Extrude11 (cut, through all)
    with BuildSketch(Plane.ZY.offset(-25.803079831)):
        with BuildLine():
            Line((40, 151.248187017), (40, 127.742316887))
            Line((40, 127.742316887), (67.099908124, 134.719475081))
            ThreePointArc((67.099908124, 134.719475081), (70.80523062, 139.333510496), (67.099908124, 143.947545912))
            Line((67.099908124, 143.947545912), (40, 151.248187017))
        make_face()
        with BuildLine():
            Line((40, 85.691199656), (40, 73.635914702))
            Line((40, 73.635914702), (49.291876994, 76.957825363))
            ThreePointArc((49.291876994, 76.957825363), (51.194464474, 79.872437157), (49.291876994, 82.787048951))
            Line((49.291876994, 82.787048951), (40, 85.691199656))
        make_face()
    extrude(amount=-CUT_EXTRUDE11_DEPTH, mode=Mode.SUBTRACT)

    # Sketch20 → Cut-Extrude12 (cut, through all)
    with BuildSketch(Plane.ZY.offset(-25.803079831)):
        with BuildLine():
            Line((40, 158.290638281), (80.627121599, 148.943019033))
            ThreePointArc((80.627121599, 148.943019033), (88.467103267, 139.291446527), (80.659173946, 129.613925972))
            Line((80.659173946, 129.613925972), (40, 120.889150176))
            Line((40, 120.889150176), (40, 114.035983465))
            Line((40, 114.035983465), (90, 114.035983465))
            Line((90, 114.035983465), (90, 165.333089545))
            Line((90, 165.333089545), (40, 165.333089545))
            Line((40, 165.333089545), (40, 158.290638281))
        make_face()
    extrude(amount=-CUT_EXTRUDE12_DEPTH, mode=Mode.SUBTRACT)

    # Sketch21 → Cut-Extrude13 (cut, through all)
    with BuildSketch(Plane.XY.offset(40)):
        with Locations((36.587729748, 199.735608582)):
            Rectangle(SKETCH21_W, SKETCH21_H)
    extrude(amount=-CUT_EXTRUDE13_DEPTH, mode=Mode.SUBTRACT)

    # Fillet1
    fillet1_edges = [part.edges().sort_by_distance(p)[0] for p in [
        (24.379537433, 180.182181868, 0),
    ]]
    fillet(fillet1_edges, radius=FILLET1_R)

    # Sketch28 → Cut-Extrude17 (cut, through all)
    with BuildSketch(Plane.XY.offset(40)):
        with Locations((33.03525061, 4.024705442)):
            Rectangle(SKETCH28_W, SKETCH28_H)
    extrude(amount=-CUT_EXTRUDE17_DEPTH, mode=Mode.SUBTRACT)

    # Sketch30 → Cut-Extrude19 (cut)
    with BuildSketch(Plane.XZ.offset(18.023943156)):
        with BuildLine():
            Line((14.156602848, -40), (-10.332701858, -15.510695295))
            ThreePointArc((-10.332701858, -15.510695295), (-17.412694024, 1.581917814), (-10.332701858, 18.674530923))
            Line((-10.332701858, 18.674530923), (13.795922062, 40))
            Line((13.795922062, 40), (-20.482716366, 40))
            Line((-20.482716366, 40), (-20.482716366, -40))
            Line((-20.482716366, -40), (14.156602848, -40))
        make_face()
    extrude(amount=-CUT_EXTRUDE19_DEPTH, mode=Mode.SUBTRACT)

    # Sketch31 → Cut-Extrude20 (cut)
    with BuildSketch(Plane.XZ.offset(-180.182181868)):
        with BuildLine():
            Line((13.795922062, 40), (-21.279421272, 18))
            ThreePointArc((-21.279421272, 18), (-30.816200409, 0), (-21.279421272, -18))
            Line((-21.279421272, -18), (13.795922062, -40))
            Line((13.795922062, -40), (-32.635756138, -40))
            Line((-32.635756138, -40), (-32.635756138, 40))
            Line((-32.635756138, 40), (13.795922062, 40))
        make_face()
    extrude(amount=-CUT_EXTRUDE20_DEPTH, mode=Mode.SUBTRACT)

    # Fillet4
    fillet4_edges = [part.edges().sort_by_distance(p)[0] for p in [
        (23.290512455, 18.87071592, 0),
        (42.779988765, 18.87071592, 0),
        (42.779988765, -10.821305037, 0),
        (23.290512455, -10.821305037, 0),
    ]]
    fillet(fillet4_edges, radius=FILLET4_R)

    # Sketch32 → Cut-Extrude21 (cut)
    with BuildSketch(Plane(origin=(0, 70.402735449, 0), x_dir=(1, 0, 0), z_dir=(0, 1, 0))):
        with BuildLine():
            Line((13.795922062, 40), (18.098262483, 66.377334942))
            ThreePointArc((18.098262483, 66.377334942), (24.598262483, 71.24906176), (31.098262483, 66.377334942))
            Line((31.098262483, 66.377334942), (35.400602905, 40))
            Line((35.400602905, 40), (35.400602905, 72))
            Line((35.400602905, 72), (13.795922062, 72))
            Line((13.795922062, 72), (13.795922062, 40))
        make_face()
    extrude(amount=-CUT_EXTRUDE21_DEPTH, mode=Mode.SUBTRACT)

    # Sketch35 → Cut-Extrude25 (cut, through all)
    with BuildSketch(Plane.ZY.offset(-13.795922062)):
        with Locations((-0.729083146, 157.159788045)):
            Rectangle(SKETCH35_W, SKETCH35_H)
    extrude(amount=-CUT_EXTRUDE25_DEPTH, mode=Mode.SUBTRACT)

    # Fillet5
    fillet5_edges = [part.edges().sort_by_distance(p)[0] for p in [
        (31.295922062, 140.218584007, -32.799176371),
        (31.295922062, 174.100992083, -32.799176371),
        (31.295922062, 174.100992083, 31.34101008),
        (31.295922062, 140.218584007, 31.34101008),
    ]]
    fillet(fillet5_edges, radius=FILLET5_R)

    # Sketch36 → Cut-Extrude26 (cut, through all)
    with BuildSketch(Plane.ZY.offset(-13.795922062)):
        with Locations((0.639461373, 42.521126055)):
            Rectangle(SKETCH36_W, SKETCH36_H)
    extrude(amount=-CUT_EXTRUDE26_DEPTH, mode=Mode.SUBTRACT)

    # Fillet6
    fillet6_edges = [part.edges().sort_by_distance(p)[0] for p in [
        (31.295922062, 26.748026337, -30.906738064),
        (31.295922062, 58.294225773, -30.906738064),
        (31.295922062, 58.294225773, 32.185660809),
        (31.295922062, 26.748026337, 32.185660809),
    ]]
    fillet(fillet6_edges, radius=FILLET6_R)

    # Sketch37 → Cut-Extrude27 (cut, through all)
    with BuildSketch(Plane(origin=(0, 219.289035295, 0), x_dir=(1, 0, 0), z_dir=(0, 1, 0))):
        Polygon((-21.279421272, 18), (13.795922062, 18), (13.795922062, 40), align=None)
        Polygon((-21.279421272, -18), (13.795922062, -18), (13.795922062, -40), align=None)
    extrude(amount=-CUT_EXTRUDE27_DEPTH, mode=Mode.SUBTRACT)

    # Sketch38 → Cut-Extrude29 (cut, through all)
    with BuildSketch(Plane.ZY.offset(-13.795922062)):
        Polygon((-40, 180.182181868), (-40, 219.289035295), (-18, 219.289035295), align=None)
        Polygon((40, 180.182181868), (40, 219.289035295), (18, 219.289035295), align=None)
    extrude(amount=-CUT_EXTRUDE29_DEPTH, mode=Mode.SUBTRACT)

    # Sketch39 → Cut-Extrude32 (cut, through all)
    with BuildSketch(Plane.ZY.offset(-13.795922062)):
        Polygon((40, 19.821446156), (40, -18.023943156), (18, -18.023943156), align=None)
        Polygon((-18, -18.023943156), (-40, -18.023943156), (-40, 19.821446156), align=None)
    extrude(amount=-CUT_EXTRUDE32_DEPTH, mode=Mode.SUBTRACT)


solid = part.part
